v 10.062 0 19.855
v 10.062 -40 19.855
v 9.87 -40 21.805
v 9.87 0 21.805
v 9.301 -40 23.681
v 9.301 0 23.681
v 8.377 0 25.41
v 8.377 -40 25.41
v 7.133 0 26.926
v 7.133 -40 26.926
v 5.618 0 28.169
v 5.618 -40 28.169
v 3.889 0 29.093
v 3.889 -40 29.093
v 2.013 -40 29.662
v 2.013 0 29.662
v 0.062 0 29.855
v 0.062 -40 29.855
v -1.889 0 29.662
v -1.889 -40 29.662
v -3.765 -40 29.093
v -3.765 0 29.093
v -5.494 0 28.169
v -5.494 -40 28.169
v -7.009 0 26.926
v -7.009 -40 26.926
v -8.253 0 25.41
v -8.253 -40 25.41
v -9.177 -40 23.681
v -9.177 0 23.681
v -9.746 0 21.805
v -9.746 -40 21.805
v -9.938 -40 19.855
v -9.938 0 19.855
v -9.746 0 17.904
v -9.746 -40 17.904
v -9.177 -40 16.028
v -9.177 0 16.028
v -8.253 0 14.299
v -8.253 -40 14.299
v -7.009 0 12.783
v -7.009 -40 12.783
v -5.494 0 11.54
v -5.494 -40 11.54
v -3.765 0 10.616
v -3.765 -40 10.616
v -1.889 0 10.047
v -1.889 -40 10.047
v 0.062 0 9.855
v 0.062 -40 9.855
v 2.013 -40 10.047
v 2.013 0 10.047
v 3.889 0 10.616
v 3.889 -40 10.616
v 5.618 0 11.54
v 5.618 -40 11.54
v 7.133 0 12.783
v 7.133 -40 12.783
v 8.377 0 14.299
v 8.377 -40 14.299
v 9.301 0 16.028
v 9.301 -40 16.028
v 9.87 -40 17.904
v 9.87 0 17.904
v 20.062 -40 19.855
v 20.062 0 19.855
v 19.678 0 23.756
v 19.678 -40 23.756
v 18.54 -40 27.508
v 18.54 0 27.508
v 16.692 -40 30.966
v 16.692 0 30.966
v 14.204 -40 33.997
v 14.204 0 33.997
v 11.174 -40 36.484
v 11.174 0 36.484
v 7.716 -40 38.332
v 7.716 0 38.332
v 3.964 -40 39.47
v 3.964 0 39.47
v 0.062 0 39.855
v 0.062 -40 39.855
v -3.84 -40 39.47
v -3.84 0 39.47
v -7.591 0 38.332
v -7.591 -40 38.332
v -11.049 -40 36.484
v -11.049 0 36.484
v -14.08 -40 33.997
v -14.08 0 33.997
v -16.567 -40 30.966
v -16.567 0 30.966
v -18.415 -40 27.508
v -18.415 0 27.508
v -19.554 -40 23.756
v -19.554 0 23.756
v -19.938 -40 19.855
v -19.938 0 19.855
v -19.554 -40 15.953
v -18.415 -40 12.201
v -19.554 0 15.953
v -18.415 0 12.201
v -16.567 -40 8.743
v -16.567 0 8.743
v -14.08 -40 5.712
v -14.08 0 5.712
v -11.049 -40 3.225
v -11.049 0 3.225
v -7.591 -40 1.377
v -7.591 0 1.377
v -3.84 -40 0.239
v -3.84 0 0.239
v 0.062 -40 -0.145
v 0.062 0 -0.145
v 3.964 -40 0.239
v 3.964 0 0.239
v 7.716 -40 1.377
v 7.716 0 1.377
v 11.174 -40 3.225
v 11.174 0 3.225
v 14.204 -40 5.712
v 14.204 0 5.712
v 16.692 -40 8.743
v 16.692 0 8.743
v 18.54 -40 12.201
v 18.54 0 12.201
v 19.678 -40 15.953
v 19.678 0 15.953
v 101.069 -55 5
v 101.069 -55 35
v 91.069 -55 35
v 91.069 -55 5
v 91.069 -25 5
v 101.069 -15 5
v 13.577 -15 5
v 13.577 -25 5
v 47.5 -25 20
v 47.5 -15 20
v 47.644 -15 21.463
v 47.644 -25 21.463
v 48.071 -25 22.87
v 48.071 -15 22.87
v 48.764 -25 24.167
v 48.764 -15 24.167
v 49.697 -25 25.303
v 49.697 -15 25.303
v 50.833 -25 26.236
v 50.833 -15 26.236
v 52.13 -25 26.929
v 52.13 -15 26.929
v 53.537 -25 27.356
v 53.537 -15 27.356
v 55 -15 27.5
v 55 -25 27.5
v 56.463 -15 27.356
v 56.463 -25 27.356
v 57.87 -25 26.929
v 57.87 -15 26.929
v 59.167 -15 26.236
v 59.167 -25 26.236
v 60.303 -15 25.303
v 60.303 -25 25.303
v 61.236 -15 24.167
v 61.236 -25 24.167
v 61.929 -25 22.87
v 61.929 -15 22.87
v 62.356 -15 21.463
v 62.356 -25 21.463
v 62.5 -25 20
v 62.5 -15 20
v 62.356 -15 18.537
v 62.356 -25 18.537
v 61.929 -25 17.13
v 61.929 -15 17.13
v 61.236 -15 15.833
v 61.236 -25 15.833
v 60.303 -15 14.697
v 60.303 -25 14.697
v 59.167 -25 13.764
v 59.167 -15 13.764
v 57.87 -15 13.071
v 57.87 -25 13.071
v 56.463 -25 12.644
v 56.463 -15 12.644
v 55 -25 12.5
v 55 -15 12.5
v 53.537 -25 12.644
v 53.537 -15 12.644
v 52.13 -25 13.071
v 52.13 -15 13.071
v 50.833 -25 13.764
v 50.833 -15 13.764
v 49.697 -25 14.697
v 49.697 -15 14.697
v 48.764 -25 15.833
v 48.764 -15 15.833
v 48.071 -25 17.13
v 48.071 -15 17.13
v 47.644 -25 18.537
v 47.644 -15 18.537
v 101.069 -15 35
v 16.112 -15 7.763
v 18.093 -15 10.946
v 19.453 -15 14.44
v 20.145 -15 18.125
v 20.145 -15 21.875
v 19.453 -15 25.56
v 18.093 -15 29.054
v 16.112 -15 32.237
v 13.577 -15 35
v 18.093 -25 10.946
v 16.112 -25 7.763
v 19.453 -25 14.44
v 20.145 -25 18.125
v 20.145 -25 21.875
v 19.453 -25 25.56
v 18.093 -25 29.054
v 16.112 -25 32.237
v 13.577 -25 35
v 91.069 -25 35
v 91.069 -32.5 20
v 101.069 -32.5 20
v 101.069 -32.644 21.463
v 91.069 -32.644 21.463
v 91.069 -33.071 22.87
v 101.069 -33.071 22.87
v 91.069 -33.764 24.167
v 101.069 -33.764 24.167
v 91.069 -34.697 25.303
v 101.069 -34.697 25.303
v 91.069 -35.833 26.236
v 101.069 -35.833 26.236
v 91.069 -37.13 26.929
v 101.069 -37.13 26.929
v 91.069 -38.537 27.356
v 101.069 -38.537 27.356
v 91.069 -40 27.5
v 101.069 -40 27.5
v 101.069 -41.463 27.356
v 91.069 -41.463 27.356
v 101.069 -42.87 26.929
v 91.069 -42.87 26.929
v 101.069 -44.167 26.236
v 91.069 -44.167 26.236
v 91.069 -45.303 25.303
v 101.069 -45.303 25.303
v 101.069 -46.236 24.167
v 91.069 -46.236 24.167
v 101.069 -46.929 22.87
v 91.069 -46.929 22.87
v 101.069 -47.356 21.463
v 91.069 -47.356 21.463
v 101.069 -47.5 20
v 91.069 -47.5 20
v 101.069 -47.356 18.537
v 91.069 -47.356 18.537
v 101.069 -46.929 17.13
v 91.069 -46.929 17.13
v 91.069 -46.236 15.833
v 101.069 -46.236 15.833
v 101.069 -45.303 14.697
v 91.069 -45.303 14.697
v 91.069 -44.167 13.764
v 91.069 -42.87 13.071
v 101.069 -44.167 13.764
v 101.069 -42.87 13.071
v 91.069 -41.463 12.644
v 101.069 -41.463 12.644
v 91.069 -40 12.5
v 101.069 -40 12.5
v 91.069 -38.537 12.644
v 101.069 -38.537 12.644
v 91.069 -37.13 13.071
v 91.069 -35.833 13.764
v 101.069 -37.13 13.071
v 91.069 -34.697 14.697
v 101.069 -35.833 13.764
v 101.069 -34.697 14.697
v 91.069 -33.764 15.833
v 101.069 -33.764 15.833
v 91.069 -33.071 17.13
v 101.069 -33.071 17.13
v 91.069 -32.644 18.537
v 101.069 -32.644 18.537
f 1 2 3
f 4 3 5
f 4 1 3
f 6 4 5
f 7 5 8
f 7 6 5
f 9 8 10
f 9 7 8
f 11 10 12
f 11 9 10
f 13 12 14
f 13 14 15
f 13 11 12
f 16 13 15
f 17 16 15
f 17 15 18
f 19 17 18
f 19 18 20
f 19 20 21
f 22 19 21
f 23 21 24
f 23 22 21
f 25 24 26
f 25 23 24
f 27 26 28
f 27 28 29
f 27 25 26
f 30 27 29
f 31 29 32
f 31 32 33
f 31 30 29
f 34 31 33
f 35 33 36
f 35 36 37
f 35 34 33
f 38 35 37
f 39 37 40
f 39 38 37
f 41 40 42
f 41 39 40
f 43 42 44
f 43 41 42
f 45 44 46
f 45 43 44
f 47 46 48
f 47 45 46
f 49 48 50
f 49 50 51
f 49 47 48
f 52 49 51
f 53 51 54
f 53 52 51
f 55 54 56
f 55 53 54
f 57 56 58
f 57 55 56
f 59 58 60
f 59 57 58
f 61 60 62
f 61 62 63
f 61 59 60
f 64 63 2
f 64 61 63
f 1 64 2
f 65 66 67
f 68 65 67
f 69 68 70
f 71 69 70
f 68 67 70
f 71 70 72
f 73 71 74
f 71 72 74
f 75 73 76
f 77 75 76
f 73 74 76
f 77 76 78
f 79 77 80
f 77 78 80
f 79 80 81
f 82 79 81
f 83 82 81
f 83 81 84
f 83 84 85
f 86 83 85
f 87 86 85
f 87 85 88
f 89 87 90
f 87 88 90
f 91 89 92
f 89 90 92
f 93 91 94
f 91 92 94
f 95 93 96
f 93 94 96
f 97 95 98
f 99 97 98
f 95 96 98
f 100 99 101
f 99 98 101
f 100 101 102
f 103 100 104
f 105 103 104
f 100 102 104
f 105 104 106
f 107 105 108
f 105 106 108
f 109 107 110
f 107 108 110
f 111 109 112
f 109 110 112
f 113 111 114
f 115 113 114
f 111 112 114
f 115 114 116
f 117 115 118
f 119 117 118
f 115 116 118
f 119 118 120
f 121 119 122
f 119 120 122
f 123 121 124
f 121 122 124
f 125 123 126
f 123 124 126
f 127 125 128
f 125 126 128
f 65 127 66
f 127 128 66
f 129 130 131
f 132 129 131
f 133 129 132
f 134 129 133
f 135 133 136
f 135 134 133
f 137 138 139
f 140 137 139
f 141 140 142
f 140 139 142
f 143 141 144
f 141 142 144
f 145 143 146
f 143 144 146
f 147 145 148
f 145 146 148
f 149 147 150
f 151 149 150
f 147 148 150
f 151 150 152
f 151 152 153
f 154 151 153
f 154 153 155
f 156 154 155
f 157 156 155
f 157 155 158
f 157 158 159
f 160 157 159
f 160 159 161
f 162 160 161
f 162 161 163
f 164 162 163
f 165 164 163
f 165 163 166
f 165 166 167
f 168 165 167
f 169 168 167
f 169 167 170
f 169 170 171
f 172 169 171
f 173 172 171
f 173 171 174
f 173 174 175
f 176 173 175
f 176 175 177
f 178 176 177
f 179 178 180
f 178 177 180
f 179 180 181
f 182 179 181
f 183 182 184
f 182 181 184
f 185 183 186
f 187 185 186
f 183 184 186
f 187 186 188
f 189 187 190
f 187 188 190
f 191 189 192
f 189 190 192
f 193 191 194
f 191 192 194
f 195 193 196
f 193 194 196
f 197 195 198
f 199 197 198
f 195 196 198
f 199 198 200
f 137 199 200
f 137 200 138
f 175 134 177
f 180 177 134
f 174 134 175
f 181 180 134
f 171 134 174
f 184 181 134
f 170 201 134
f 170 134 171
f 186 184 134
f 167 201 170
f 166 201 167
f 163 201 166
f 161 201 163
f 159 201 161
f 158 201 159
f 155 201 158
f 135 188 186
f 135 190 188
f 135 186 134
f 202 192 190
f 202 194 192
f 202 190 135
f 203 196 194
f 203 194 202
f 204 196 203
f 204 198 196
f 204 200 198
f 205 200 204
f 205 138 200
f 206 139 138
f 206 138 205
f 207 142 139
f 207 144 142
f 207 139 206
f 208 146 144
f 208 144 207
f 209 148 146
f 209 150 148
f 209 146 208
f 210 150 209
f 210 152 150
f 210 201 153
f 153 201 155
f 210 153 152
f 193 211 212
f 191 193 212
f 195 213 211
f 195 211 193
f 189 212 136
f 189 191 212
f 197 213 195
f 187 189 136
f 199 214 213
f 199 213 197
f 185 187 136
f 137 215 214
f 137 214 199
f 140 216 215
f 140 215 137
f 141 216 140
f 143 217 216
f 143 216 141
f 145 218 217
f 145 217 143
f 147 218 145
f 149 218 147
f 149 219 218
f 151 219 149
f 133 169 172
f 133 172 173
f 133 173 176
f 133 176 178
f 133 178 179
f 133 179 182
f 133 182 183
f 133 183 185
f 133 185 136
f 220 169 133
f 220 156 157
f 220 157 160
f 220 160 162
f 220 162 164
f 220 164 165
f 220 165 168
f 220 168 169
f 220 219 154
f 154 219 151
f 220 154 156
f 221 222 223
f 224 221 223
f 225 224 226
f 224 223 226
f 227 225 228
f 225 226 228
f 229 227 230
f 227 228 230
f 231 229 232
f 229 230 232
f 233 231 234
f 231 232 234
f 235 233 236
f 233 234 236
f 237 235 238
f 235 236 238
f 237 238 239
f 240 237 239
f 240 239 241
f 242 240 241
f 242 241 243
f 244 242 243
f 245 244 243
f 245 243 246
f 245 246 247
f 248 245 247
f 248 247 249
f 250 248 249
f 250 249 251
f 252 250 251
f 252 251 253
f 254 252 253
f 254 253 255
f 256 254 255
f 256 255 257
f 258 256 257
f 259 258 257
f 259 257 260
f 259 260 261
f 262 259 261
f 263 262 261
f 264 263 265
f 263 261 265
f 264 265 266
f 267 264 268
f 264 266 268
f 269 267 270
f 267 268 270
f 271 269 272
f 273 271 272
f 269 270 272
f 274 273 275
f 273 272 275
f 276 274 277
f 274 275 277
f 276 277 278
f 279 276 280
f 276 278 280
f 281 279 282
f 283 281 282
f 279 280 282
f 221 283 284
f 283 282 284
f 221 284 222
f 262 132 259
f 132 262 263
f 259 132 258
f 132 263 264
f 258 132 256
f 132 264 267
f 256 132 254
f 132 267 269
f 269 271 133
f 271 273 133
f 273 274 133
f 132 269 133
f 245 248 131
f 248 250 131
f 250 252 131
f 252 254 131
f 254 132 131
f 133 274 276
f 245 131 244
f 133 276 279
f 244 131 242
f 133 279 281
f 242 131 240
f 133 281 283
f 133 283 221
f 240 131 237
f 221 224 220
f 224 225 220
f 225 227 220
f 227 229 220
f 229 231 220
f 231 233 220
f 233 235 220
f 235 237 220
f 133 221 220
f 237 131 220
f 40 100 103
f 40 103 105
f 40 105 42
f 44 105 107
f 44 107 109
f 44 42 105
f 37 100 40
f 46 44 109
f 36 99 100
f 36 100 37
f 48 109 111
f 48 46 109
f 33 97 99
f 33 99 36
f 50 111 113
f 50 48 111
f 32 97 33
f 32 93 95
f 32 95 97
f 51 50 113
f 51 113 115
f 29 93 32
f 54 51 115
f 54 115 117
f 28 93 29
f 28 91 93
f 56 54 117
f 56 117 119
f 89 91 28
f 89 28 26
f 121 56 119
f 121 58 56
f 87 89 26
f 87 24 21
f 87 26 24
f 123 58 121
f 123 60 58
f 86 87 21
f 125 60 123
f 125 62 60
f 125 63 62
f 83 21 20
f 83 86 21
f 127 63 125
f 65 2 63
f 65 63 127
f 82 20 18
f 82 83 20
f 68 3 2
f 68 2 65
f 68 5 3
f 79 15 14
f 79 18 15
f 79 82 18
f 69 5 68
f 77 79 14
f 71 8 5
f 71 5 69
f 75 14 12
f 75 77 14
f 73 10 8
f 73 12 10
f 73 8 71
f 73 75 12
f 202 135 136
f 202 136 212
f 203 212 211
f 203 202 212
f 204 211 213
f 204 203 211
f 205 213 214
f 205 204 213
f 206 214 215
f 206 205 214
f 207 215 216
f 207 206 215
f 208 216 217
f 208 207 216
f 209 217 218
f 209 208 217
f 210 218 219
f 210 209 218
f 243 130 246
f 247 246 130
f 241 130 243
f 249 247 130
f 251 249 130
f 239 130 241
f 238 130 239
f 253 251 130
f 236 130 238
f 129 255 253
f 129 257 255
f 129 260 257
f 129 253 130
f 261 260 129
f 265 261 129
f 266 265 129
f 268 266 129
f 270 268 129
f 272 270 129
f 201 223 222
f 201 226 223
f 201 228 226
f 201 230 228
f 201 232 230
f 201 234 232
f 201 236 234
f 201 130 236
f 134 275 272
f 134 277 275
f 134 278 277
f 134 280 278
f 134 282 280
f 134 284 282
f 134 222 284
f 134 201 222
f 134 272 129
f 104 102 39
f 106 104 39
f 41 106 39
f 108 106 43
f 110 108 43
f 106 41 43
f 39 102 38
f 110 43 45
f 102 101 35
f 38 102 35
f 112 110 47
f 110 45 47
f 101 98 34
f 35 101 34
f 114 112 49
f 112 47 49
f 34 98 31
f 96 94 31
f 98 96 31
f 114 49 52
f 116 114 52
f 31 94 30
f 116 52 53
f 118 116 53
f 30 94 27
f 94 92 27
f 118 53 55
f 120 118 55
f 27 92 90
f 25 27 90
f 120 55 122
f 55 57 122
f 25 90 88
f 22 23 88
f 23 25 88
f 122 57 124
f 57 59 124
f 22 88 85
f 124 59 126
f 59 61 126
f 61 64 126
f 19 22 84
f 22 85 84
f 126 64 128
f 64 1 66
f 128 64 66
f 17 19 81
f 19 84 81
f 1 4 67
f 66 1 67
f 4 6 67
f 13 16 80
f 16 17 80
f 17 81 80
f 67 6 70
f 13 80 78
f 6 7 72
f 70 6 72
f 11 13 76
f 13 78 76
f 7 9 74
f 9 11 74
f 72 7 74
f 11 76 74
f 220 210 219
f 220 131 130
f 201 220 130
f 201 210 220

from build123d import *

# Parameters (mm, degrees)
F0_R      = 20
F0_R_2    = 10
F1_DEPTH  = 40
F4_DEPTH  = 40
F5_W      = 77.4922952824
F5_H      = 30
F6_DEPTH  = 35.1464343736
F7_R      = 7.5
F8_DEPTH  = 40.001
F9_R      = 7.5
F10_DEPTH = 121.0079549157


with BuildPart() as f1:
    # F0 (on Front) → F1 (new body)
    with BuildSketch(Plane.XZ):
        with Locations((0.0621909407, 19.8545656264)):
            Circle(F0_R)
        with Locations((0.0621909407, 19.8545656264)):
            Circle(F0_R_2, mode=Mode.SUBTRACT)
    extrude(amount=F1_DEPTH)


with BuildPart() as f4:
    # F3 (on offset) → F4 (new body)
    with BuildSketch(Plane(origin=(0, -15, 0), x_dir=(-1, 0, 0), z_dir=(0, 1, 0))):
        with BuildLine():
            Line((-101.0691458563, 35), (-101.0691458563, 20))
            Line((-101.0691458563, 20), (-101.0691458563, 5))
            Line((-101.0691458563, 5), (-13.576850574, 5))
            ThreePointArc((-13.576850574, 5), (-20.231927034, 20), (-13.576850574, 35))
            Line((-13.576850574, 35), (-101.0691458563, 35))
        make_face()
    extrude(amount=-F4_DEPTH)

    # F5 (on face) → F6 (cut, through all)
    with BuildSketch(Plane.XY.offset(35)):
        with Locations((52.3229982152, -40)):
            Rectangle(F5_W, F5_H)
    extrude(amount=-F6_DEPTH, mode=Mode.SUBTRACT)

    # F7 (on face) → F8 (cut, through all)
    with BuildSketch(Plane(origin=(0, -15, 0), x_dir=(-1, 0, 0), z_dir=(0, 1, 0))):
        with Locations((-55, 20)):
            Circle(F7_R)
    extrude(amount=-F8_DEPTH, mode=Mode.SUBTRACT)

    # F9 (on face) → F10 (cut, through all)
    with BuildSketch(Plane.YZ.offset(101.0691458563)):
        with Locations((-40, 20)):
            Circle(F9_R)
    extrude(amount=-F10_DEPTH, mode=Mode.SUBTRACT)


solid = Compound([f1.part, f4.part])
